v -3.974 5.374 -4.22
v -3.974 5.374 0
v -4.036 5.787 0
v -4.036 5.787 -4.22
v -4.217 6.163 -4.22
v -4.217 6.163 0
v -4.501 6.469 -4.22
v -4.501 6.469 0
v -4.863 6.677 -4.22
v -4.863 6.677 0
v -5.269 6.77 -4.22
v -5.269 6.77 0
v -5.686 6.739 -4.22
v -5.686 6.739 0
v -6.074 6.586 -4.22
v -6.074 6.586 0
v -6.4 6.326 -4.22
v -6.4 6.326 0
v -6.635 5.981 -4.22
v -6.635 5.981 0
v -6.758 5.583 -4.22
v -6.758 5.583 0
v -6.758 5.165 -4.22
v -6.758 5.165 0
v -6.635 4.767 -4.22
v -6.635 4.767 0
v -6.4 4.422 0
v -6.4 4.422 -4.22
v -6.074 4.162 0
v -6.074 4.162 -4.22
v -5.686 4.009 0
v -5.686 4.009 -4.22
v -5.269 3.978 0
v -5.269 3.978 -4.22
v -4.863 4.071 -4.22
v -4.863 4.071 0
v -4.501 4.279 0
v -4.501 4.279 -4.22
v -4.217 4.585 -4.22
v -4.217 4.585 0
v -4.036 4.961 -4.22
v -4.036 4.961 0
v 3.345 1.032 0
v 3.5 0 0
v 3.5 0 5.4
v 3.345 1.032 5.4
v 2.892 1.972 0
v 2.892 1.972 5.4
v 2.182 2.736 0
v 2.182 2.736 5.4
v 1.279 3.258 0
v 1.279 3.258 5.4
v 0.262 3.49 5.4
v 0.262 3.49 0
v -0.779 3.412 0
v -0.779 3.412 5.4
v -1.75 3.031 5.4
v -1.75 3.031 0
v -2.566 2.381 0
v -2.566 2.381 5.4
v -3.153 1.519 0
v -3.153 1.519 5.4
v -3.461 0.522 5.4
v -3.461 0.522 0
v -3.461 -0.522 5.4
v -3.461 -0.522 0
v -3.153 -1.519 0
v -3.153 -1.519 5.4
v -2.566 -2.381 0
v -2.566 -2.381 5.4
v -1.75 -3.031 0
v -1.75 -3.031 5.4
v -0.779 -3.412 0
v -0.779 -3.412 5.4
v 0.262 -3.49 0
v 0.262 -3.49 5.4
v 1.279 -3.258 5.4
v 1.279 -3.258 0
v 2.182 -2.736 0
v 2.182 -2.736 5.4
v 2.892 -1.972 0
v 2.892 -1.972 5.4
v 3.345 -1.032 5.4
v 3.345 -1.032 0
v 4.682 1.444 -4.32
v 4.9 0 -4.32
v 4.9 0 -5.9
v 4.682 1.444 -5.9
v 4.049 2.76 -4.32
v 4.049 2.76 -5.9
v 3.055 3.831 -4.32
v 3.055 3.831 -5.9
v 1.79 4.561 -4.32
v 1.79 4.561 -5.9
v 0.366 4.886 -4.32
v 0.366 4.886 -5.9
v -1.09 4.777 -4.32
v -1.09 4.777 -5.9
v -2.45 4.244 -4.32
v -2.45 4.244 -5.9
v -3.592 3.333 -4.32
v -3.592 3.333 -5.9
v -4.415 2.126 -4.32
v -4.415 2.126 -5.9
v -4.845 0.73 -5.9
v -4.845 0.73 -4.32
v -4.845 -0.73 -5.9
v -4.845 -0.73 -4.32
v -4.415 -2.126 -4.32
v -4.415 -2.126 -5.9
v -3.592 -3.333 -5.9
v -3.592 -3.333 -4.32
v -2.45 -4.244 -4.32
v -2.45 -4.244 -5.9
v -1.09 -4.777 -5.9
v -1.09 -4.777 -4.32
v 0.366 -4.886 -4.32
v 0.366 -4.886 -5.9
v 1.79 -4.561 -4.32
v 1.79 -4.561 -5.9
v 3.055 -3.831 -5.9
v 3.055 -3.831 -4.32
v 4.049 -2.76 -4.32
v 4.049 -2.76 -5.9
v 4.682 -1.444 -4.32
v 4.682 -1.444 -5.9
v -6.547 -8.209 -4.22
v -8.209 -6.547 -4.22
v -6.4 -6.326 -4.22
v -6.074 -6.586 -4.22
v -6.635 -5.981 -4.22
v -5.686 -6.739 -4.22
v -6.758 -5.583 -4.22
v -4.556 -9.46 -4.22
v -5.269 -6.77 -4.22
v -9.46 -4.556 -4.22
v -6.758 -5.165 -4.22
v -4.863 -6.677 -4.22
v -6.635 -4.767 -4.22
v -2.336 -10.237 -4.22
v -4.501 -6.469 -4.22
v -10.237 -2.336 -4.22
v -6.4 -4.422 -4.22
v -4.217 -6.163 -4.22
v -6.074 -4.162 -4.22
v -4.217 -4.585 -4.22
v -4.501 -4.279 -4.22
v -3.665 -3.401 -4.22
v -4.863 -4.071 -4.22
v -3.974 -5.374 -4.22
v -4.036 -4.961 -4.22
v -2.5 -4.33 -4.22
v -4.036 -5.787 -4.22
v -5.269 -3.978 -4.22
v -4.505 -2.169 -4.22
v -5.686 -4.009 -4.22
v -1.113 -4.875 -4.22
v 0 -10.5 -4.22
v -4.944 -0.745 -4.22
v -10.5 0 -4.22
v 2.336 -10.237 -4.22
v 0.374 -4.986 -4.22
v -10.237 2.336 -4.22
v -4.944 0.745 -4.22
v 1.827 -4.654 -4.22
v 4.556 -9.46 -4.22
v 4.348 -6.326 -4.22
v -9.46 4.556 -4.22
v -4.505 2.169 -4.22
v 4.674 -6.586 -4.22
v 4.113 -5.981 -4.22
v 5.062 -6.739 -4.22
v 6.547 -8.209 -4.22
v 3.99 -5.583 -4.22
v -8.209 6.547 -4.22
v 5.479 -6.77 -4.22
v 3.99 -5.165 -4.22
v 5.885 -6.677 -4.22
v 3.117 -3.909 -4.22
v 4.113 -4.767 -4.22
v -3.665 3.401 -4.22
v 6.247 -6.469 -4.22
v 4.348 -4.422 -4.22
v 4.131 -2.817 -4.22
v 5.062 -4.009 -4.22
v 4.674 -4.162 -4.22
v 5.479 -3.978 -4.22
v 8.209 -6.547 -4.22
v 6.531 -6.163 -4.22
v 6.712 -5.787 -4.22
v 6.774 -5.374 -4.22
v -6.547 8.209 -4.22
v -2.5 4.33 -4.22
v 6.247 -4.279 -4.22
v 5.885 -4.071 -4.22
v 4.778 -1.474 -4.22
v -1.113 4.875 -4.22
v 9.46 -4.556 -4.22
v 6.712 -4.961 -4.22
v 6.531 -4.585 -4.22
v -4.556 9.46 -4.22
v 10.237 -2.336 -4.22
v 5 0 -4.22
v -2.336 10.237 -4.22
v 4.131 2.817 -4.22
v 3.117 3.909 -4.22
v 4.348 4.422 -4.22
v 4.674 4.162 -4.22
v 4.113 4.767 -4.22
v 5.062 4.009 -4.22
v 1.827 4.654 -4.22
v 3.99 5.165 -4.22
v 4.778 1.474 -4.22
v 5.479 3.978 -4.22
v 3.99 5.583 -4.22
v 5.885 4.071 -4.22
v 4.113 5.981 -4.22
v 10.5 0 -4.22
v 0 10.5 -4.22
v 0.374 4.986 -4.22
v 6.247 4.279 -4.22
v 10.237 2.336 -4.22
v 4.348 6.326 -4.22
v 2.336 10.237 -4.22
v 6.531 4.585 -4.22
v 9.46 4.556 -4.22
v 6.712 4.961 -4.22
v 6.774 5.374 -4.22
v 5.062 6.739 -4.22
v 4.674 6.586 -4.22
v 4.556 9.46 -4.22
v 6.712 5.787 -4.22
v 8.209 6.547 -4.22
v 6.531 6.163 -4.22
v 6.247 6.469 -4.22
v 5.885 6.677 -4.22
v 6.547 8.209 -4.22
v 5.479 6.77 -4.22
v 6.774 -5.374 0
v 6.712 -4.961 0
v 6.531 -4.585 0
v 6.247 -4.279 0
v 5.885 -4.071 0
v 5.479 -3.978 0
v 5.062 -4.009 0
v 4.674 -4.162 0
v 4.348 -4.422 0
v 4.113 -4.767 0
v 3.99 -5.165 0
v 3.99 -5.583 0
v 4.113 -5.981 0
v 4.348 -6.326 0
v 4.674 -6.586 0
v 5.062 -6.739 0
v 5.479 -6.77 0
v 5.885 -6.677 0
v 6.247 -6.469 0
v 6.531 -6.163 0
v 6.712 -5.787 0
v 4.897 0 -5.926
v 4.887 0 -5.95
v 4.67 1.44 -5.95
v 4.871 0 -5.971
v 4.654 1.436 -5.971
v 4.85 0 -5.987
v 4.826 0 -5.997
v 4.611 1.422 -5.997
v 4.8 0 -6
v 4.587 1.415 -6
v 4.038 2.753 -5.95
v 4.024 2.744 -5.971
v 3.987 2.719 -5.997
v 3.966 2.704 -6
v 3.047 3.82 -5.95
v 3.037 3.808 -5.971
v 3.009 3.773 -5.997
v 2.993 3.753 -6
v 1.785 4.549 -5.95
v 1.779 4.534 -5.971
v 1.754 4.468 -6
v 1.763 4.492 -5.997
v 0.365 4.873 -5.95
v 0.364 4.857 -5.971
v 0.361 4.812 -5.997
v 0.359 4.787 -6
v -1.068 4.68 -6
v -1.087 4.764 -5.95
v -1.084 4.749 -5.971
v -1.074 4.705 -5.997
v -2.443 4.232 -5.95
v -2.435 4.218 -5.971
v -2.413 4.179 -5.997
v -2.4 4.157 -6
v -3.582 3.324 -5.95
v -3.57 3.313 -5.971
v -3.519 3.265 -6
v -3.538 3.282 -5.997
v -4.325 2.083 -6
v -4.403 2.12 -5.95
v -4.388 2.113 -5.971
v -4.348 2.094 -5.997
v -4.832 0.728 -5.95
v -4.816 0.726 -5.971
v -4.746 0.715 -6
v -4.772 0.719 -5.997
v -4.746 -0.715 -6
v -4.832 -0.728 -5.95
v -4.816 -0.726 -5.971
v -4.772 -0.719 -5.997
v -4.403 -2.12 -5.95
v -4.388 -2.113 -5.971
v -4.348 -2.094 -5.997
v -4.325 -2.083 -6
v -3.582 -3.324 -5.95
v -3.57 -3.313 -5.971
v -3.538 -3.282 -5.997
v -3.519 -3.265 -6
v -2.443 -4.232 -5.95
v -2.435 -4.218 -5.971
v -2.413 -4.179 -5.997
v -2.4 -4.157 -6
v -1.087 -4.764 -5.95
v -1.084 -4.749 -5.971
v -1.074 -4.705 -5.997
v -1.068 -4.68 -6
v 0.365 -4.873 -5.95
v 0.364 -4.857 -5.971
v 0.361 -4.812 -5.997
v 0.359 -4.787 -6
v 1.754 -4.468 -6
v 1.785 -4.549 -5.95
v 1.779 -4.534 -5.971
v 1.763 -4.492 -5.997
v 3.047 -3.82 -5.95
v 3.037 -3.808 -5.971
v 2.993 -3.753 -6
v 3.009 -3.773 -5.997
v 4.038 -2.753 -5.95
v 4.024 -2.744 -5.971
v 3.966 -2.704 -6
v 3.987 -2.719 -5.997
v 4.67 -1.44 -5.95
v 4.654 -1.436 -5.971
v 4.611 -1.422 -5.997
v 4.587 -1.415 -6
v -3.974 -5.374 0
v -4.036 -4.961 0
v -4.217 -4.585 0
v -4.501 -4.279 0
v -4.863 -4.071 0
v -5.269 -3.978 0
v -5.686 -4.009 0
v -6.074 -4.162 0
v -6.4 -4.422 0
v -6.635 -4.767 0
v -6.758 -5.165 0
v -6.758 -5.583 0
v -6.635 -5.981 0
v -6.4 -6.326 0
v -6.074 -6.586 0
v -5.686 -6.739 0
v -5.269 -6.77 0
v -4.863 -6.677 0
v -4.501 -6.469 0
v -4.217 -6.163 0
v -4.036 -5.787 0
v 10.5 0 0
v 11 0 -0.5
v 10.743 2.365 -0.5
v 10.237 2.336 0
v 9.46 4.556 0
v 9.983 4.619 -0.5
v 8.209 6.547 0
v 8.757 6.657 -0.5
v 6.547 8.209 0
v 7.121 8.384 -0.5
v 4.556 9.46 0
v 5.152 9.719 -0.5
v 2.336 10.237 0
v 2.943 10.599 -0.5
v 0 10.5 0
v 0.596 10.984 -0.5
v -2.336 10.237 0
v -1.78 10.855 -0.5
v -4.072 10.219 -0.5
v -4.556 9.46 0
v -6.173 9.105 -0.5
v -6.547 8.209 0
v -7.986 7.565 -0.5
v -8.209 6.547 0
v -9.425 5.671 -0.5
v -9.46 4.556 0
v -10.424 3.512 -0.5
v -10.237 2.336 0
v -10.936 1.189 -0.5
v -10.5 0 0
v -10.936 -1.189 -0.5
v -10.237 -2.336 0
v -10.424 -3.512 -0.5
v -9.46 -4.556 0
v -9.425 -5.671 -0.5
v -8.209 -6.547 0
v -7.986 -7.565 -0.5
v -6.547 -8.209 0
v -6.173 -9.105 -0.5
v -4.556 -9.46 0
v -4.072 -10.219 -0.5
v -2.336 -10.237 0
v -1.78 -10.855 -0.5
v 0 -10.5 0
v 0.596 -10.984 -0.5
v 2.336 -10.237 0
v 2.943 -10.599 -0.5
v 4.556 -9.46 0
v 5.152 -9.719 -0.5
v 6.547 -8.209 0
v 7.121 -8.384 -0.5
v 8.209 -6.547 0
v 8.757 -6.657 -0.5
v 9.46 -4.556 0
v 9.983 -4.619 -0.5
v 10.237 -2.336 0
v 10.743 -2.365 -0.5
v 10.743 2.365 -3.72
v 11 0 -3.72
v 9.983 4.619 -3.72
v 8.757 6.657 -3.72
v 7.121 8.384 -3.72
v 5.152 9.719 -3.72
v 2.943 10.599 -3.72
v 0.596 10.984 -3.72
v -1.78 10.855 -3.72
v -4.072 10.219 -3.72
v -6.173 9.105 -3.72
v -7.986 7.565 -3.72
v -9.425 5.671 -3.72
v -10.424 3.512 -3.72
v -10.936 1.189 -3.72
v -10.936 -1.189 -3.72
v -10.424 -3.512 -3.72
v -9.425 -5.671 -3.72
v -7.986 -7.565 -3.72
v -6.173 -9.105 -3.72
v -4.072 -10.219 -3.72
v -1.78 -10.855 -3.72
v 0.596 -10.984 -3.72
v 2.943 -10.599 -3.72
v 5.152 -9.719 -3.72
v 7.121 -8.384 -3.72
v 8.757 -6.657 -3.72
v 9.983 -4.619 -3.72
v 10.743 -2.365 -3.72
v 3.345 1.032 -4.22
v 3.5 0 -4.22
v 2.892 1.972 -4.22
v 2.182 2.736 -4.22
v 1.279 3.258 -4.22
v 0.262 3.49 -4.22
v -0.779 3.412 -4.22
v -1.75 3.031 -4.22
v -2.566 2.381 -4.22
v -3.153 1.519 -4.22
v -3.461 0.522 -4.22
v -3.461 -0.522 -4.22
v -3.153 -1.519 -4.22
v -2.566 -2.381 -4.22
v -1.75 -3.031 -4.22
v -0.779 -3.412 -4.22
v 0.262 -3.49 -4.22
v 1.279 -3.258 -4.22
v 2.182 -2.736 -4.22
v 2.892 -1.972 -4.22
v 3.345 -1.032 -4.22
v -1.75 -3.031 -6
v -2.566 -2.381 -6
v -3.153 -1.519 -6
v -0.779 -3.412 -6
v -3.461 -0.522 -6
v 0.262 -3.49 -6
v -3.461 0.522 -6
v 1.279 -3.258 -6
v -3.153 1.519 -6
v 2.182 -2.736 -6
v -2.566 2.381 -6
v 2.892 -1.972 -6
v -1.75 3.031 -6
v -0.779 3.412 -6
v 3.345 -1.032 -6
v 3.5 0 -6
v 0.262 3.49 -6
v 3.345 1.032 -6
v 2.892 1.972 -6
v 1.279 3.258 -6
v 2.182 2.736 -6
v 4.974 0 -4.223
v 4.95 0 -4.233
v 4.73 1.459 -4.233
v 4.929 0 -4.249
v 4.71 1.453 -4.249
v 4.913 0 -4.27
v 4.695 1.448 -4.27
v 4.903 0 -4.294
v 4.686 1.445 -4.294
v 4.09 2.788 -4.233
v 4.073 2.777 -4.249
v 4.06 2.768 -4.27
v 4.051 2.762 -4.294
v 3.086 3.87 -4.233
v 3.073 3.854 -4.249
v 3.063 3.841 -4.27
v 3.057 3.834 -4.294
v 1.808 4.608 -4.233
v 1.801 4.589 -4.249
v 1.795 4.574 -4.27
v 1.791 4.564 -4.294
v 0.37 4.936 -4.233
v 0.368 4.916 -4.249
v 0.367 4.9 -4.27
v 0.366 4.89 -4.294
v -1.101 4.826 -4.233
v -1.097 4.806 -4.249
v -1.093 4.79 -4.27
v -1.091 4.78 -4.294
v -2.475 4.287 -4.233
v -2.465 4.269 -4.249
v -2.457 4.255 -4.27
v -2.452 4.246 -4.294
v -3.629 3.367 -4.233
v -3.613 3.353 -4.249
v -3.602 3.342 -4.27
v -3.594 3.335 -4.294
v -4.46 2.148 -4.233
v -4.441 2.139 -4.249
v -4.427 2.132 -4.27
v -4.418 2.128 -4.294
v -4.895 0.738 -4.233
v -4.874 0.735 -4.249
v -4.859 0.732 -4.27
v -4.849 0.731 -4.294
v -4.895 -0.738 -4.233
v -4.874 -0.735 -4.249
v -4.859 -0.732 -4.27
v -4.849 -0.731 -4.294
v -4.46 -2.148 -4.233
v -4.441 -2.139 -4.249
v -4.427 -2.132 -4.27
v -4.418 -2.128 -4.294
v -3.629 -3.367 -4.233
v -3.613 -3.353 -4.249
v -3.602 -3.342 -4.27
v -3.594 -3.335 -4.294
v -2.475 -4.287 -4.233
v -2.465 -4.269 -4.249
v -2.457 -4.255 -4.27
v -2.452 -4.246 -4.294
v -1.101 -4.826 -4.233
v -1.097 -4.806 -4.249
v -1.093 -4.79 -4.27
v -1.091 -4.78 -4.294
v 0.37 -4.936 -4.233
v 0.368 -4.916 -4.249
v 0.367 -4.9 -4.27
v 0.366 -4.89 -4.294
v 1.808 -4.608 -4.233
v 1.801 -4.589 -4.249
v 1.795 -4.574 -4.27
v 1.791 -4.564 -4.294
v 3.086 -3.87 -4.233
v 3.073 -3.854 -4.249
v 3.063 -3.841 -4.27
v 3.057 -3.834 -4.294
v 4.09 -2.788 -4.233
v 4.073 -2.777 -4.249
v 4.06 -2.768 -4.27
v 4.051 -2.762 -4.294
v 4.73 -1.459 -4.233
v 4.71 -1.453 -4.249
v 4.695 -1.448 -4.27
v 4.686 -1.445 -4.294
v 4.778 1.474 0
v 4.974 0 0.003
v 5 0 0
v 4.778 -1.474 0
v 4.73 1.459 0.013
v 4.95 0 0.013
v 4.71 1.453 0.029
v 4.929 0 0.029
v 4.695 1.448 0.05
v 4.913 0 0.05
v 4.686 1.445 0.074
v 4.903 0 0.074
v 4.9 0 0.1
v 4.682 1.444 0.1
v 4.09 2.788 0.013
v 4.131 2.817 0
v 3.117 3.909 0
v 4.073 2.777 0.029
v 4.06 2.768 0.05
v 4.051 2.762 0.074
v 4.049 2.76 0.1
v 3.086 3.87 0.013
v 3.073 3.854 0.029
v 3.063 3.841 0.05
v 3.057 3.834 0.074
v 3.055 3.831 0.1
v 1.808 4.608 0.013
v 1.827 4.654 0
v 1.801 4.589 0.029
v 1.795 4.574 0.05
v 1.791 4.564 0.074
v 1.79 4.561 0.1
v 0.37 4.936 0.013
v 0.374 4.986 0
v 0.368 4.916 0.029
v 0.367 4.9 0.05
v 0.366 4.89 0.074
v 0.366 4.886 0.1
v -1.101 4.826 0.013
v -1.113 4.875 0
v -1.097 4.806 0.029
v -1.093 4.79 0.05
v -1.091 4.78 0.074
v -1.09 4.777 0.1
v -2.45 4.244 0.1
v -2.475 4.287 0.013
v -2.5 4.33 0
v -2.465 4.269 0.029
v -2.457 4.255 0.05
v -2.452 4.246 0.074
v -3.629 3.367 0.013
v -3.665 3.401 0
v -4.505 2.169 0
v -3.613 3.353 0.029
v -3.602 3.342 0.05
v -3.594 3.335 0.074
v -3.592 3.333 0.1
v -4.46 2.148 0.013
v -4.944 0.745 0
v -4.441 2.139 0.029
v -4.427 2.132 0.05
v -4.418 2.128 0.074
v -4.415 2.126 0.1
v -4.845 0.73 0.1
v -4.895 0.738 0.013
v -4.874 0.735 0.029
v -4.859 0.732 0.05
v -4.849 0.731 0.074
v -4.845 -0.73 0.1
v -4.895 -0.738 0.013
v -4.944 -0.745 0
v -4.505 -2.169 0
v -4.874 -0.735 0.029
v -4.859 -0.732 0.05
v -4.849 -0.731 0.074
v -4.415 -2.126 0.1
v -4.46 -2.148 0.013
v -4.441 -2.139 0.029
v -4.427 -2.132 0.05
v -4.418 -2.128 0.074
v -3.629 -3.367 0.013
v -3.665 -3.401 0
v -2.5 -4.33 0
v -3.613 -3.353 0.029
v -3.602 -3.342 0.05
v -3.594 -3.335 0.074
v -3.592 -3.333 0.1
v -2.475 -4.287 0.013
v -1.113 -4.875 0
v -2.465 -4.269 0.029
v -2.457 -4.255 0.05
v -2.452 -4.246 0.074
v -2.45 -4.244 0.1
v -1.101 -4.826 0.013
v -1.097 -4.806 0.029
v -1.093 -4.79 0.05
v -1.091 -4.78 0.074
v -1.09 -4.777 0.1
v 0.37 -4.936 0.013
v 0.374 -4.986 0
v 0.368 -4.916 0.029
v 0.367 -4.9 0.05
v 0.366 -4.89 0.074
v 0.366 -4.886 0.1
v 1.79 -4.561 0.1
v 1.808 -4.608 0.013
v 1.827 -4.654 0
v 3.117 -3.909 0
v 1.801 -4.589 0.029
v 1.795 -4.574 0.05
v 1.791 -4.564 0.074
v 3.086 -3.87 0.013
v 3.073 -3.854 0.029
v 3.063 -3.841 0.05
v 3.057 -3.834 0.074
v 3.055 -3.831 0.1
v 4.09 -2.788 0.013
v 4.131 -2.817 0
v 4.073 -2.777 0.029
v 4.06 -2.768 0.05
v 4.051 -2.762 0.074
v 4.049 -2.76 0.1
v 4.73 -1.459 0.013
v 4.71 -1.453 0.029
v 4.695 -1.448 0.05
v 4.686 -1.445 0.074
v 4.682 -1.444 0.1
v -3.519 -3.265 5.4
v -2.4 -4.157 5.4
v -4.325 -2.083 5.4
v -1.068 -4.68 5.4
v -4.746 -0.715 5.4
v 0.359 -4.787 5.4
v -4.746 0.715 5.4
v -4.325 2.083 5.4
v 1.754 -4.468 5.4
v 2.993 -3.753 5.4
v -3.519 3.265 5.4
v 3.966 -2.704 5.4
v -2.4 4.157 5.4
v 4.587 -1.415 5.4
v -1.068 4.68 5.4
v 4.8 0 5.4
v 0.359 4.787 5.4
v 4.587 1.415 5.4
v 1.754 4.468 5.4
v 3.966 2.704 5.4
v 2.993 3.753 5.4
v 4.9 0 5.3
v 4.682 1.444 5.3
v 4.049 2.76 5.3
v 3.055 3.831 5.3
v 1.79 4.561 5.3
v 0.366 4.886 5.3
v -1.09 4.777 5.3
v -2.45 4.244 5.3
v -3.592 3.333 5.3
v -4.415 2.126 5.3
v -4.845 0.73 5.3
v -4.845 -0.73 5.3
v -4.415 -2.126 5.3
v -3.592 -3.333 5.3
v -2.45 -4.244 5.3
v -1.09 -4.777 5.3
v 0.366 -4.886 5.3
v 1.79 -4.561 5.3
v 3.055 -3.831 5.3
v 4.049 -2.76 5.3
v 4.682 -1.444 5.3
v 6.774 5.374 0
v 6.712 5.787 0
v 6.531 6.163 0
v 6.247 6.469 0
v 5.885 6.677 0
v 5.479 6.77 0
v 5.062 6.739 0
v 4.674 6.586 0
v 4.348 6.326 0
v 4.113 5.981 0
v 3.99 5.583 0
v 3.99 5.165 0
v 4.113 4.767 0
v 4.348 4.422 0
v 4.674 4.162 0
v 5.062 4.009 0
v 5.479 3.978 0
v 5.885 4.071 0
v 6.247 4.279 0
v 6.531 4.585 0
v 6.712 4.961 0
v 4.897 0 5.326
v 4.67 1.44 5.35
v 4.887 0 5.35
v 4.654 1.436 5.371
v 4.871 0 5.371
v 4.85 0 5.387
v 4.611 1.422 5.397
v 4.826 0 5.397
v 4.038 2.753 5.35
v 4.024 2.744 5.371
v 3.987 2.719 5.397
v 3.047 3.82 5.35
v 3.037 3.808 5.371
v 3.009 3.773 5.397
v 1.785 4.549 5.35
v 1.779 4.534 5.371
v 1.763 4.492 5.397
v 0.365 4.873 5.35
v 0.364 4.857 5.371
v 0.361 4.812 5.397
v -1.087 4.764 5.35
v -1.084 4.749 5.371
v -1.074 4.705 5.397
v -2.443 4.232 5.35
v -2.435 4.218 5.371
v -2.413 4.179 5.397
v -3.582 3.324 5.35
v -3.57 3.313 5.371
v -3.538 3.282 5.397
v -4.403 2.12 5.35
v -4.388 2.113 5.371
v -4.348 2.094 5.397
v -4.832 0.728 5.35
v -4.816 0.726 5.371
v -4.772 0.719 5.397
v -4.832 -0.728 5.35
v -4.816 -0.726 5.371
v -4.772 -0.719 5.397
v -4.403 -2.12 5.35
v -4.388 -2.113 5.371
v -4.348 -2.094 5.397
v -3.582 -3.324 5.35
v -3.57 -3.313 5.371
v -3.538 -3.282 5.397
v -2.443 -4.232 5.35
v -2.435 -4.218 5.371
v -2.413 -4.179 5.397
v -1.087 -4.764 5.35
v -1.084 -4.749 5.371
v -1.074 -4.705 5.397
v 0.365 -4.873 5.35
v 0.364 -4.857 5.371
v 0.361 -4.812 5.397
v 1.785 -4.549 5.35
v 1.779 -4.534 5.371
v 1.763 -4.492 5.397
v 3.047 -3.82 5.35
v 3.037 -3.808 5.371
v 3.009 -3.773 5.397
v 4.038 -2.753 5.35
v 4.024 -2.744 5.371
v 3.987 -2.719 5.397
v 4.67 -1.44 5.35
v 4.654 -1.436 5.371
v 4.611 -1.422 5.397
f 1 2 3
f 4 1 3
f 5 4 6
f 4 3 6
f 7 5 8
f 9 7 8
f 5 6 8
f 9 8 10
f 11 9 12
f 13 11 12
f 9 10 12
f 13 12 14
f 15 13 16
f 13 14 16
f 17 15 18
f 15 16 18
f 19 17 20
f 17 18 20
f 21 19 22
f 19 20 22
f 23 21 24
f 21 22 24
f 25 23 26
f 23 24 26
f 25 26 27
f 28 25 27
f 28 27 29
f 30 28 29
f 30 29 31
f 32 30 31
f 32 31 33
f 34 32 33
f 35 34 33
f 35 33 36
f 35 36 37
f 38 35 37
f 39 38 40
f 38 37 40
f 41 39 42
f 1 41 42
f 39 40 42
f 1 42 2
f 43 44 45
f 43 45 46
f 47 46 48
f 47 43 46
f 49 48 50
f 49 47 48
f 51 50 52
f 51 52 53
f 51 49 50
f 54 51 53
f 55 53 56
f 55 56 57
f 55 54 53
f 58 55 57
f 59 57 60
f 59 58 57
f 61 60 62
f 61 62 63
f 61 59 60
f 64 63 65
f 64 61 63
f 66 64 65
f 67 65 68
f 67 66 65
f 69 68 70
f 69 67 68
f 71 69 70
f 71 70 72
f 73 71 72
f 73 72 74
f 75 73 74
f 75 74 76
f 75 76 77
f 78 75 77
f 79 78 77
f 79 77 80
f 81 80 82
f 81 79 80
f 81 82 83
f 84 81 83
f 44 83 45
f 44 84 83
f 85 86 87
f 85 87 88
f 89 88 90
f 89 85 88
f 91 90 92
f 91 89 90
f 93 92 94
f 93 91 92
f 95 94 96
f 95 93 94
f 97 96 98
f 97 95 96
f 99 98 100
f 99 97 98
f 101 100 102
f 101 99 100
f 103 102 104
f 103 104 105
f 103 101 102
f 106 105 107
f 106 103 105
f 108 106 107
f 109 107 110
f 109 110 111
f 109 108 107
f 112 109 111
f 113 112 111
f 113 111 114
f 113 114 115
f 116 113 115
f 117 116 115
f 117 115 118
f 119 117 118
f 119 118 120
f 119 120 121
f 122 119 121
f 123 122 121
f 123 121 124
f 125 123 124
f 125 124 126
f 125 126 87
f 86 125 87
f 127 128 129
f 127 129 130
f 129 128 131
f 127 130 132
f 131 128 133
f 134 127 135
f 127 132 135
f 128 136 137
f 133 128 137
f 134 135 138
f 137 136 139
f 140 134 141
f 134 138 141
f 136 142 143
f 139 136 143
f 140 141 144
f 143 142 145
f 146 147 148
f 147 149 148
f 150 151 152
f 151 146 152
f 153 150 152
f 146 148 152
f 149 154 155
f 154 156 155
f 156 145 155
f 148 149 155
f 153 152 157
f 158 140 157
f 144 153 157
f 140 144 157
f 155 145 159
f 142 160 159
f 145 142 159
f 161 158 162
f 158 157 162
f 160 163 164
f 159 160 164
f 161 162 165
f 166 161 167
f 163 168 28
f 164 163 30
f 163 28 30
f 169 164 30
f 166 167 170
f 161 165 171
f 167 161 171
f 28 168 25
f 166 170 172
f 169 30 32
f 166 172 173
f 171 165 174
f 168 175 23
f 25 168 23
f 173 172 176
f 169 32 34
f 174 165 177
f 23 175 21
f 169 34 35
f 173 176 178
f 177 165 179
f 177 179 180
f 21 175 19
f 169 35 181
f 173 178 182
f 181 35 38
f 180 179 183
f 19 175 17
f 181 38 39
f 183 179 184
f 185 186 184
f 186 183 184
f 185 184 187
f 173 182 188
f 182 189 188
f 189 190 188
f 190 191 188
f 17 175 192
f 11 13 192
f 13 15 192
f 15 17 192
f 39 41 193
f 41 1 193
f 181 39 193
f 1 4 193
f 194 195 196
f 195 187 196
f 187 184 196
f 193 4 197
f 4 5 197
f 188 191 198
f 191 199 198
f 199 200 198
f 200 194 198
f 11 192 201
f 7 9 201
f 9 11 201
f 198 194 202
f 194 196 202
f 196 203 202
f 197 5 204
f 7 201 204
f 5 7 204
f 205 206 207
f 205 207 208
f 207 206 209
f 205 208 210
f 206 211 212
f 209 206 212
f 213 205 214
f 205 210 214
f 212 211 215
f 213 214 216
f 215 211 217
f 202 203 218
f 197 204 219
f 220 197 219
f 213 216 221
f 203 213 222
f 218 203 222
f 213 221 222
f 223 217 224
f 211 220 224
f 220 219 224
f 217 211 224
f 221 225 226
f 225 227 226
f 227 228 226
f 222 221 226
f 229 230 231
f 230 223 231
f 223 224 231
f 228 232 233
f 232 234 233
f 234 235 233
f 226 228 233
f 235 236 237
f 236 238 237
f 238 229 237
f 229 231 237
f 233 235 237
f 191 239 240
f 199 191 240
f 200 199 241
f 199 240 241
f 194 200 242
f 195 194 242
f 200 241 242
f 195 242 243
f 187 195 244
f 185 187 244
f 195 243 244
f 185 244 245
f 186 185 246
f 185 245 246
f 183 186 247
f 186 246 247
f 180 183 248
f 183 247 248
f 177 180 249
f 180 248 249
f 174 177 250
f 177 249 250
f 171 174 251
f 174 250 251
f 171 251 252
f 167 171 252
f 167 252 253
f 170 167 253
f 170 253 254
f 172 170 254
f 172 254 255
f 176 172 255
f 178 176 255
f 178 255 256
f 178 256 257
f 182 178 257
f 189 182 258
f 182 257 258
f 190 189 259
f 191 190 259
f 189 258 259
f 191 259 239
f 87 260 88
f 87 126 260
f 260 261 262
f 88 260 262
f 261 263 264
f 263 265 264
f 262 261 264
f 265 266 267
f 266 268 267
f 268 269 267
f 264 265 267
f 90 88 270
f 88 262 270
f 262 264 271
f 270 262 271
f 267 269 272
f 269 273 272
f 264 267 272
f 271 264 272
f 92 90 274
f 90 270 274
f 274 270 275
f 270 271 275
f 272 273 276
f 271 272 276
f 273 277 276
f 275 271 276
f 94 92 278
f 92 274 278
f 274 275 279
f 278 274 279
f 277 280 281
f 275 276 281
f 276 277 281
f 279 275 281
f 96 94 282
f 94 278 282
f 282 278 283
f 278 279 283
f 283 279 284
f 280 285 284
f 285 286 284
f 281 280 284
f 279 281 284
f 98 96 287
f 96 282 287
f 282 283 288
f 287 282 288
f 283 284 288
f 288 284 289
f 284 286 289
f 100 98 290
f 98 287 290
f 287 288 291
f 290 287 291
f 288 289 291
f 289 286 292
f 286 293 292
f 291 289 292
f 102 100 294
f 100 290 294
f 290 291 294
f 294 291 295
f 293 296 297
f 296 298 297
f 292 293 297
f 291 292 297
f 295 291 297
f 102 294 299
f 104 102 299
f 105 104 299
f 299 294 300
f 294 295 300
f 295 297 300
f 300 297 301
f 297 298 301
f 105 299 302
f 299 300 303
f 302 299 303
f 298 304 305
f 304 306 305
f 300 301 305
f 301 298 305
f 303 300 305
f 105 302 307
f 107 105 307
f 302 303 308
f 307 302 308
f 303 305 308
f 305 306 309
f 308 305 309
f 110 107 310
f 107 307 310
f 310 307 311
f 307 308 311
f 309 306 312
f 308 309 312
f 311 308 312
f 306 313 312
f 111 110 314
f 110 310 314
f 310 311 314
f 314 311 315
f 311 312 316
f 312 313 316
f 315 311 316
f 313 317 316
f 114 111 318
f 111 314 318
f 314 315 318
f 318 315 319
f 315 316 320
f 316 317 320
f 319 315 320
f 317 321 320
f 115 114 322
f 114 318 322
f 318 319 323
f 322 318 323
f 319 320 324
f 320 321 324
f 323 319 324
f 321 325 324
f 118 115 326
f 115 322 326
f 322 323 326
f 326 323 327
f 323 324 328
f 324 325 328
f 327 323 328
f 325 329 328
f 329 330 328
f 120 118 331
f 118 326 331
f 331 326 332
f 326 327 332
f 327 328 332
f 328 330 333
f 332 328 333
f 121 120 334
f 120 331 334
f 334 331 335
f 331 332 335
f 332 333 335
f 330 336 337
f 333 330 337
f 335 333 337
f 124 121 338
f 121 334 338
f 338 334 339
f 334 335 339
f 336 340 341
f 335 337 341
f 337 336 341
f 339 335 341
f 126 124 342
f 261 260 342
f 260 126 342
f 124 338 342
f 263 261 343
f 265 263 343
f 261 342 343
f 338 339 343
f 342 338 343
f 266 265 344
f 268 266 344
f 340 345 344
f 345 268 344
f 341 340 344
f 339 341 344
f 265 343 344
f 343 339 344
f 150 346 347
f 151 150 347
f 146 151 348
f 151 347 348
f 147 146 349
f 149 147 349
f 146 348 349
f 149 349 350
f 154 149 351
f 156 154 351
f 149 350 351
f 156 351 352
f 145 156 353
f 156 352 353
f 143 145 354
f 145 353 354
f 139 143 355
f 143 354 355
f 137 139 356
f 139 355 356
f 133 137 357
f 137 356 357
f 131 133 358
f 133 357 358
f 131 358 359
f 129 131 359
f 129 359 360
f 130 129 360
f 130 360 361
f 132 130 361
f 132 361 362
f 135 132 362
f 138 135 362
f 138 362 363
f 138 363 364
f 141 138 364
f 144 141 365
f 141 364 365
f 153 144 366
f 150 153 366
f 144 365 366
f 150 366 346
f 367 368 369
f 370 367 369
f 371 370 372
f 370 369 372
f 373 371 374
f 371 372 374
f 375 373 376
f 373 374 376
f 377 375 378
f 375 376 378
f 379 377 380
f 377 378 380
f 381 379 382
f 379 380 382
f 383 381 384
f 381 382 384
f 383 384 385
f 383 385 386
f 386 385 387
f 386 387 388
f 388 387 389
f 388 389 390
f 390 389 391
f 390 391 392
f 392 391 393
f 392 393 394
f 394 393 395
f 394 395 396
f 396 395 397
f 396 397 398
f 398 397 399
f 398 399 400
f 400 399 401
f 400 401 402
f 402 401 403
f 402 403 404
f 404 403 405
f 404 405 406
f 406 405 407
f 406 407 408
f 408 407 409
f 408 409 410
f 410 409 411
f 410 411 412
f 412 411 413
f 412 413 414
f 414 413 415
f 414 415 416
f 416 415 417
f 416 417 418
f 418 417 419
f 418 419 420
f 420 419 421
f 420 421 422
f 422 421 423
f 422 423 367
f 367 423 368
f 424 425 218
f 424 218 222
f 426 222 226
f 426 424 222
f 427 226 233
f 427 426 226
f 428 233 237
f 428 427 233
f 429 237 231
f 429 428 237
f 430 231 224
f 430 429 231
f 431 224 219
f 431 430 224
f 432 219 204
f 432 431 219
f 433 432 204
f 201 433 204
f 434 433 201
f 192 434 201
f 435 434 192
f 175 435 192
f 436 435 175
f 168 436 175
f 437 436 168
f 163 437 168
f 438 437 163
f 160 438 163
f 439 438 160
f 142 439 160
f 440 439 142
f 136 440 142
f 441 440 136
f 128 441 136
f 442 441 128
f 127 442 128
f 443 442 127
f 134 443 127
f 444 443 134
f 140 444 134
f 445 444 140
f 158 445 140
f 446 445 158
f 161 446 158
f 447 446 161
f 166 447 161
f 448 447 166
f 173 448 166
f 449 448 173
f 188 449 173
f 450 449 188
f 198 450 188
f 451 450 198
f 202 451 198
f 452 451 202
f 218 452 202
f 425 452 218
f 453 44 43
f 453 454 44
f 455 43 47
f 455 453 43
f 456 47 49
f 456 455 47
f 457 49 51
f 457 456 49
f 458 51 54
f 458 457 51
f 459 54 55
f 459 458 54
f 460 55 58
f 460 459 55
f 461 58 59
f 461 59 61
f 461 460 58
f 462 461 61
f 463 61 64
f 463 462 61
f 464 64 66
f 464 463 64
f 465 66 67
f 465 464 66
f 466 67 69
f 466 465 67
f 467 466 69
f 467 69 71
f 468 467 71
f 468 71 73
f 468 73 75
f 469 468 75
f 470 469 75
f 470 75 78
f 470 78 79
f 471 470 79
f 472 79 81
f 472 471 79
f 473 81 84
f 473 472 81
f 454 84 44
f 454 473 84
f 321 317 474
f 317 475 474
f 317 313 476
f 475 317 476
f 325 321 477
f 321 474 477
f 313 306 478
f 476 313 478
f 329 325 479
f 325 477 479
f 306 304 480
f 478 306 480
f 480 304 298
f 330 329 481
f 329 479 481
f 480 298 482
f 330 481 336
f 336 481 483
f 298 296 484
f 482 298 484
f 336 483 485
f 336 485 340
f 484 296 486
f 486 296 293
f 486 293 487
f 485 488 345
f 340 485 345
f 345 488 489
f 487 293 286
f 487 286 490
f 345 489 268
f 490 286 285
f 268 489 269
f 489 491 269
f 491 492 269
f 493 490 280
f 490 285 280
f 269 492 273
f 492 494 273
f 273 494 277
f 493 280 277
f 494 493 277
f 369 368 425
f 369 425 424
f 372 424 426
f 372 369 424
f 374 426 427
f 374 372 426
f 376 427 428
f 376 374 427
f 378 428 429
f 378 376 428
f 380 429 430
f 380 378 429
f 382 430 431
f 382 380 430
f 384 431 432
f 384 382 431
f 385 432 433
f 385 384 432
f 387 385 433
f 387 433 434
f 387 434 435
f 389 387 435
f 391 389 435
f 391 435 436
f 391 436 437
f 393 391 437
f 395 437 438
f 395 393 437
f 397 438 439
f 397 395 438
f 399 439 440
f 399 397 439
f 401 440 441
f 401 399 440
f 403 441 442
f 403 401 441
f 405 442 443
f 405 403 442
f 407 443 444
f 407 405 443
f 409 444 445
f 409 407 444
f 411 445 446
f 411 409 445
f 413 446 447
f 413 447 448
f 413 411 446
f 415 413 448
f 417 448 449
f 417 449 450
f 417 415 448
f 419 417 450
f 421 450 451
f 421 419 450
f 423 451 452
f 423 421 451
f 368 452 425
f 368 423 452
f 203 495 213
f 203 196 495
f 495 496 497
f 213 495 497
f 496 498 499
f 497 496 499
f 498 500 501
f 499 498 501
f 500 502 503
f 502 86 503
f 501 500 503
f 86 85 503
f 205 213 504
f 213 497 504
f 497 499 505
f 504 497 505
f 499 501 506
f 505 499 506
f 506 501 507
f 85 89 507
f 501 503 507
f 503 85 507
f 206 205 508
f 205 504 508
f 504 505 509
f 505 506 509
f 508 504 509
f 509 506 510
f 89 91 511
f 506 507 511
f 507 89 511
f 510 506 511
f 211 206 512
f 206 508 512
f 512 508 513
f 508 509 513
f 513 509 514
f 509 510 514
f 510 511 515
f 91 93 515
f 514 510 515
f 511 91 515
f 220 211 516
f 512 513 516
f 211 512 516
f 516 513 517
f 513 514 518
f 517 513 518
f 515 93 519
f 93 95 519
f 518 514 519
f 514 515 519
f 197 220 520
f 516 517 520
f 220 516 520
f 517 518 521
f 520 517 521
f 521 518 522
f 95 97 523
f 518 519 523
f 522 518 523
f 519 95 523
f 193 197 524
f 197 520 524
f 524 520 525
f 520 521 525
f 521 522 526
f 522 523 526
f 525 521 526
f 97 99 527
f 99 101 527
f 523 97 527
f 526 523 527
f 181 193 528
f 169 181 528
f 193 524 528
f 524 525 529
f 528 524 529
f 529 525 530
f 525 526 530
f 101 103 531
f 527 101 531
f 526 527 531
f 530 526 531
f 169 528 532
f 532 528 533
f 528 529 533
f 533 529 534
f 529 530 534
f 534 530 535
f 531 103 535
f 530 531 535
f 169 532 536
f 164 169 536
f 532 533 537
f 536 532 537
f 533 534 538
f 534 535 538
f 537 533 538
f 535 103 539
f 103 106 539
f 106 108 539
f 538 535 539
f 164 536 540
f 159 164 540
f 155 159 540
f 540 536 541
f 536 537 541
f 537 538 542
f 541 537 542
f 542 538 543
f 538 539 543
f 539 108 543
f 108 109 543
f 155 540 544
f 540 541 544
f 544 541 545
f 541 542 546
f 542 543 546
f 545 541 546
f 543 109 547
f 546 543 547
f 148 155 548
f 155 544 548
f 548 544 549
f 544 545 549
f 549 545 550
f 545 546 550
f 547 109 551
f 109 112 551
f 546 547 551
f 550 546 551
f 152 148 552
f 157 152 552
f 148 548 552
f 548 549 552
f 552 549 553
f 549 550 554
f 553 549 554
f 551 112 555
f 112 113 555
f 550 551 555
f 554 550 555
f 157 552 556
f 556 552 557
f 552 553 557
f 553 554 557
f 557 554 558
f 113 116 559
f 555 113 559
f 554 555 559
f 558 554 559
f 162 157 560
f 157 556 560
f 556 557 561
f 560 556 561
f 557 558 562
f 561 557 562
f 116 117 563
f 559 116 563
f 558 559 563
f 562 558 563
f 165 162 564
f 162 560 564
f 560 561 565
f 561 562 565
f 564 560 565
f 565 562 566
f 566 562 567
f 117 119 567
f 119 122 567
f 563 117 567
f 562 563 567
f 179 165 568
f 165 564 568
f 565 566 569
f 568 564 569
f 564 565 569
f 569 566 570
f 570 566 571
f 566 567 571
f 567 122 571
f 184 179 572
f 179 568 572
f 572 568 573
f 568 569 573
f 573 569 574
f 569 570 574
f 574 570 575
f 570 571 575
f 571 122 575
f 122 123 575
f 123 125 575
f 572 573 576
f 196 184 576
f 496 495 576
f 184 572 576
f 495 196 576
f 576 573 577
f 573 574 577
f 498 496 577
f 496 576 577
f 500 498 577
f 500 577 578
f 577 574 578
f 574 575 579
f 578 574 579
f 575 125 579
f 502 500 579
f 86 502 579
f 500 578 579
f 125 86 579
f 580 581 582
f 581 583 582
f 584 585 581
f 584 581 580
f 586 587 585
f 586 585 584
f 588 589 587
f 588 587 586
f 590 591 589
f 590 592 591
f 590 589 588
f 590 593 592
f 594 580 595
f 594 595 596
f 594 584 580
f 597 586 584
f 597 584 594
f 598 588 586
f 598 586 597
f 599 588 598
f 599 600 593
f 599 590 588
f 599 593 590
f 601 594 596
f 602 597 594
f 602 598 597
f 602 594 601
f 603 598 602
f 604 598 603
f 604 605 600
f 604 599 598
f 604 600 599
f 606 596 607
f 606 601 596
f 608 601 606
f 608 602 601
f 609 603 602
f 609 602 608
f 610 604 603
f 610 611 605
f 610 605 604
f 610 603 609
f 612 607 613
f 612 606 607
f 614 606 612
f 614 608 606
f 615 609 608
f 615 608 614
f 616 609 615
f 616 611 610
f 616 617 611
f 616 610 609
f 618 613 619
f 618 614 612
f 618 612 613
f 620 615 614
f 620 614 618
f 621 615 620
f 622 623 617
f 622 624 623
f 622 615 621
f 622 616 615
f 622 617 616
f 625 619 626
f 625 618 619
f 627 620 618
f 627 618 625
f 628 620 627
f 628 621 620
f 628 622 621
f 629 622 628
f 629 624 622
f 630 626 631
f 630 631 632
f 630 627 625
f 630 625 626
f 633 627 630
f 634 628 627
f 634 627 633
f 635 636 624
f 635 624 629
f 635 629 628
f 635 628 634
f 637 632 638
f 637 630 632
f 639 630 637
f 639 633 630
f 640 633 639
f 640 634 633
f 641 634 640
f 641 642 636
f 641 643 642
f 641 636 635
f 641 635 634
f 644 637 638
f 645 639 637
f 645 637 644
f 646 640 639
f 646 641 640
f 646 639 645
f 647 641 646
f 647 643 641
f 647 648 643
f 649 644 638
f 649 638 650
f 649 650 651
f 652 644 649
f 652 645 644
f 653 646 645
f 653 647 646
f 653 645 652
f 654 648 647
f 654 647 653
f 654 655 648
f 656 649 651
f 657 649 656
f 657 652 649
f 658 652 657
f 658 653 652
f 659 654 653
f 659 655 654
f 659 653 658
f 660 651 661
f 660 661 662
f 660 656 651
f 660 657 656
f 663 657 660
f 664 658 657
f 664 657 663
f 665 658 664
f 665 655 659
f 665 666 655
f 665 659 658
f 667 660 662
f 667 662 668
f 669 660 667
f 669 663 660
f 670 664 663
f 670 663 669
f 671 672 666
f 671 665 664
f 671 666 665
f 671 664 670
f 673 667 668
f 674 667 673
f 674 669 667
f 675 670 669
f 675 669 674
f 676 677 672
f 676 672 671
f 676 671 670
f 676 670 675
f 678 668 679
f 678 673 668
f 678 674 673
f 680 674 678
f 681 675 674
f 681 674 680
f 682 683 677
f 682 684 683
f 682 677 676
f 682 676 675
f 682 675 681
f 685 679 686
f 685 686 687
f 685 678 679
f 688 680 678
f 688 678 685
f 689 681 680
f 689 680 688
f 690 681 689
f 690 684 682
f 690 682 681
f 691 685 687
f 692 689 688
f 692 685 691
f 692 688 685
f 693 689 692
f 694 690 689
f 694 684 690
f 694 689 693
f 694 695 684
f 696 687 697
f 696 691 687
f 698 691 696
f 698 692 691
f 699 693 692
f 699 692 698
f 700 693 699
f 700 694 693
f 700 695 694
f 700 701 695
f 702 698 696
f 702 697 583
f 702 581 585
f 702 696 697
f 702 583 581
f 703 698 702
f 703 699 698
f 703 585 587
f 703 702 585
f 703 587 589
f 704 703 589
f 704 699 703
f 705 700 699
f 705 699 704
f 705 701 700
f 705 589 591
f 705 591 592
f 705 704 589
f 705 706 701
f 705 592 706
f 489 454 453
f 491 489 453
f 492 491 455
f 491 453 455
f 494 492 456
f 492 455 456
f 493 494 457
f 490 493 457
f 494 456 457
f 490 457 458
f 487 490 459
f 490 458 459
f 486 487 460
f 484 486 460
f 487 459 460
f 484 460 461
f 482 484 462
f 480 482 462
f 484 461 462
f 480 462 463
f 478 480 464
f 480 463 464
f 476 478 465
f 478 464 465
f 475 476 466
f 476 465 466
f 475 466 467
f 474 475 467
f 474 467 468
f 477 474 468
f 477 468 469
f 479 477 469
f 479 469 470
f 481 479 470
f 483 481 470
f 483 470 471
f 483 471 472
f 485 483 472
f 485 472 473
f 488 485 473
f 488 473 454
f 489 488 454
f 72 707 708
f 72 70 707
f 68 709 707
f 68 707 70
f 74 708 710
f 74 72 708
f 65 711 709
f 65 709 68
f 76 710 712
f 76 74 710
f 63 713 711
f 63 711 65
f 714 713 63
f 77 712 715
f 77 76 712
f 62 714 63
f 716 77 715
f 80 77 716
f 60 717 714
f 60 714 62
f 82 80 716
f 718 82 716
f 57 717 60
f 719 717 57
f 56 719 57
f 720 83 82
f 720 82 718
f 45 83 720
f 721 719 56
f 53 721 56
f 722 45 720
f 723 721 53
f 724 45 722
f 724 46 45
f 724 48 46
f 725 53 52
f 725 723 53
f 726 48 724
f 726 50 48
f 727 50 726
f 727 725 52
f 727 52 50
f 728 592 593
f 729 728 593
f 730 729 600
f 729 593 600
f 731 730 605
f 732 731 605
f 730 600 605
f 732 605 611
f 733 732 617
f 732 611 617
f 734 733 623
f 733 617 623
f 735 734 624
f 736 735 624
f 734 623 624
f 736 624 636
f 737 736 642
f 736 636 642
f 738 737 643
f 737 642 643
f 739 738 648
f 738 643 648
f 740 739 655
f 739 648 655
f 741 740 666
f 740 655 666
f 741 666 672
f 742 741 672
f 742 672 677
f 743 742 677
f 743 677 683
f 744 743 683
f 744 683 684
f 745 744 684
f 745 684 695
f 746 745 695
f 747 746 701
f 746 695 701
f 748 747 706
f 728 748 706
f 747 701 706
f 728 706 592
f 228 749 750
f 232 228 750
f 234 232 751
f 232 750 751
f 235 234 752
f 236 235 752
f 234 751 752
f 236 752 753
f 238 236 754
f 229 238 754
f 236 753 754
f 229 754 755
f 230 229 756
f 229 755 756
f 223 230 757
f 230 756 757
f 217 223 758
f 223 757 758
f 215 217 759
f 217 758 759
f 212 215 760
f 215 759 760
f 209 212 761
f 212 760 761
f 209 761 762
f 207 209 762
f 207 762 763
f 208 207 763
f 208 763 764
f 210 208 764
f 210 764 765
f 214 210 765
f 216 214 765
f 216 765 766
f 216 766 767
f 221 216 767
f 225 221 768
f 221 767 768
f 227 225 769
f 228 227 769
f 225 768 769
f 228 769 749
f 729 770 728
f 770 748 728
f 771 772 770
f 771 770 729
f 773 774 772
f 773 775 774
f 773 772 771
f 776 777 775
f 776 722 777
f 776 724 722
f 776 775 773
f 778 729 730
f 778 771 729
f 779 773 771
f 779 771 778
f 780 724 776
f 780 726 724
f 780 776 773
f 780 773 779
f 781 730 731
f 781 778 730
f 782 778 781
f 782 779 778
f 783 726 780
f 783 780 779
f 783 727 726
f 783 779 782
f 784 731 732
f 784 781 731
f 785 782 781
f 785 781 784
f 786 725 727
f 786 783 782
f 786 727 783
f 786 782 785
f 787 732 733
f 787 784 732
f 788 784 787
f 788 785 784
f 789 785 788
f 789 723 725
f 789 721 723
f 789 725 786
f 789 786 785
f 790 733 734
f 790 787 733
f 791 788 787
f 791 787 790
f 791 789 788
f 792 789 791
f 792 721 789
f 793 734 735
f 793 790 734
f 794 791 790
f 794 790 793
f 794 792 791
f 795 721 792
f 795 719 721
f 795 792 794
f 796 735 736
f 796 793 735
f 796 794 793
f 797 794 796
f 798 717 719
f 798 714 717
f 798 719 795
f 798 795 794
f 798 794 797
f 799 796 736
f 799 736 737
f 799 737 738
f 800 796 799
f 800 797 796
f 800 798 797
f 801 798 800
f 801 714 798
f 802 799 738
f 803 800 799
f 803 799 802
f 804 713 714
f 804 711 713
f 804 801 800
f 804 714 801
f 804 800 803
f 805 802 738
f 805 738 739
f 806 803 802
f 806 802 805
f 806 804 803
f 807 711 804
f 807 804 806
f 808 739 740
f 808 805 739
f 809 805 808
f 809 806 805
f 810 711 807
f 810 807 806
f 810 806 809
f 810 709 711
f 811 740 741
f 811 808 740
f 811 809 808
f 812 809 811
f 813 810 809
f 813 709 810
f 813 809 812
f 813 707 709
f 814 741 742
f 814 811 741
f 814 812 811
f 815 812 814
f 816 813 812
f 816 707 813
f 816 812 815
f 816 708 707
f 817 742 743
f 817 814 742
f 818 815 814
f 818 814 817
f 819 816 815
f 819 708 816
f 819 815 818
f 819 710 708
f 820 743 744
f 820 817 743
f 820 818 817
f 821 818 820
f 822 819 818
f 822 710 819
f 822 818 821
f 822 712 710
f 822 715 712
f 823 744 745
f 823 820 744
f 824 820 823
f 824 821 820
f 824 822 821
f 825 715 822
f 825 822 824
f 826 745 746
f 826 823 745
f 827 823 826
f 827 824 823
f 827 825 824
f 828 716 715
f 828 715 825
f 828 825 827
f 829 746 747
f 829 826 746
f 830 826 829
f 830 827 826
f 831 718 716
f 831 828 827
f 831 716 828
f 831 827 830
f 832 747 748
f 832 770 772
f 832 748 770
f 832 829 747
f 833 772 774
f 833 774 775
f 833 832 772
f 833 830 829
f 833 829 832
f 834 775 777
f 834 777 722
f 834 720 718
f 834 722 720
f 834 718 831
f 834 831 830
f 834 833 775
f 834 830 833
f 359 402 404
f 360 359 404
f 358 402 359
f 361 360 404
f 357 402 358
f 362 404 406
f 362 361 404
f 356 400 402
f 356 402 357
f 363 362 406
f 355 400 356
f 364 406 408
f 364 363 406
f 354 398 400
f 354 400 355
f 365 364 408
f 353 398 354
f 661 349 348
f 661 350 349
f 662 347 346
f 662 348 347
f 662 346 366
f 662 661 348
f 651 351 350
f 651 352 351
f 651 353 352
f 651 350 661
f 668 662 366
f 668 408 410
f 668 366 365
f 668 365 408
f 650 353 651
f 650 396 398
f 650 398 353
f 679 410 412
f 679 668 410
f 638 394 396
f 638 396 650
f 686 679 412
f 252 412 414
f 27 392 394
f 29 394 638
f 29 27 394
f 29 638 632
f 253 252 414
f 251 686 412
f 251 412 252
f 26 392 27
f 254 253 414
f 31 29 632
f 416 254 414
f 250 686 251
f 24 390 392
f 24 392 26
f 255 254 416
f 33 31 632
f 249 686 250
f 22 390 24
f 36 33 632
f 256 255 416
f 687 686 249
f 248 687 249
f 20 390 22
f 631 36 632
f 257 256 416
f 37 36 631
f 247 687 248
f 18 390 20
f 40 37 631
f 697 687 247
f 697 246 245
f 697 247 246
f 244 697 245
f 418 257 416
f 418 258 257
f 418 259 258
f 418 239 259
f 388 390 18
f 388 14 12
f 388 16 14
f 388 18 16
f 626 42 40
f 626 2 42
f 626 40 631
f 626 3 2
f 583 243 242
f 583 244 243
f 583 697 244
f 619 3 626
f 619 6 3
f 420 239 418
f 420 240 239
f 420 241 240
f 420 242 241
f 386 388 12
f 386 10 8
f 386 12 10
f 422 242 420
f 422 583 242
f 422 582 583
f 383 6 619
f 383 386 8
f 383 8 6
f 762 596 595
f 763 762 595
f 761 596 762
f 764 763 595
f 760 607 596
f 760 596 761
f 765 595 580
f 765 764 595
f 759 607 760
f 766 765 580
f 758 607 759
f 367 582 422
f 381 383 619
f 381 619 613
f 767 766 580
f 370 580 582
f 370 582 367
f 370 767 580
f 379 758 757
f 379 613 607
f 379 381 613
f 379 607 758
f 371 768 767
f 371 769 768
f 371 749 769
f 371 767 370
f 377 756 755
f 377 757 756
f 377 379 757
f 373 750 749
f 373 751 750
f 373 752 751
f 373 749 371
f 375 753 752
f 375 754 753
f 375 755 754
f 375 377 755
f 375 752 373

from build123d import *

# Parameters (mm, degrees)
F0_R          = 11
F0_R_2        = 1.4
F0_R_3        = 4.9
F0_R_4        = 3.5
F1_DEPTH      = 4.22
F2_DEPTH      = 5.4
F2_DEPTH_BACK = 6
F3_SIZE       = 0.5
F4_R          = 0.1


with BuildPart() as f1:
    # F0 (on Top) → F1 (new body)
    with BuildSketch(Plane.XY):
        Circle(F0_R)
        with Locations((-5.374011537, -5.374011537)):
            Circle(F0_R_2, mode=Mode.SUBTRACT)
        with Locations((5.374011537, -5.374011537)):
            Circle(F0_R_2, mode=Mode.SUBTRACT)
        with Locations((-5.374011537, 5.374011537)):
            Circle(F0_R_2, mode=Mode.SUBTRACT)
        Circle(F0_R_3, mode=Mode.SUBTRACT)
        with Locations((5.374011537, 5.374011537)):
            Circle(F0_R_2, mode=Mode.SUBTRACT)
        Circle(F0_R_3)
        Circle(F0_R_4, mode=Mode.SUBTRACT)
    extrude(amount=-F1_DEPTH)

    # F0 (on Top) → F2 (join, two sides)
    with BuildSketch(Plane.XY) as f2_sk:
        Circle(F0_R_3)
        Circle(F0_R_4, mode=Mode.SUBTRACT)
    extrude(amount=F2_DEPTH)
    extrude(f2_sk.sketch, amount=-F2_DEPTH_BACK)

    # F3
    f3_edges = [f1.edges().sort_by_distance(p)[0] for p in [
        (-11, 0, 0),
        (-11, 0, -4.22),
    ]]
    chamfer(f3_edges, length=F3_SIZE)

    # F4
    f4_edges = [f1.edges().sort_by_distance(p)[0] for p in [
        (-4.9, 0, 5.4),
        (-4.9, 0, 0),
        (-4.9, 0, -4.22),
        (-4.9, 0, -6),
    ]]
    fillet(f4_edges, radius=F4_R)


solid = f1.part
